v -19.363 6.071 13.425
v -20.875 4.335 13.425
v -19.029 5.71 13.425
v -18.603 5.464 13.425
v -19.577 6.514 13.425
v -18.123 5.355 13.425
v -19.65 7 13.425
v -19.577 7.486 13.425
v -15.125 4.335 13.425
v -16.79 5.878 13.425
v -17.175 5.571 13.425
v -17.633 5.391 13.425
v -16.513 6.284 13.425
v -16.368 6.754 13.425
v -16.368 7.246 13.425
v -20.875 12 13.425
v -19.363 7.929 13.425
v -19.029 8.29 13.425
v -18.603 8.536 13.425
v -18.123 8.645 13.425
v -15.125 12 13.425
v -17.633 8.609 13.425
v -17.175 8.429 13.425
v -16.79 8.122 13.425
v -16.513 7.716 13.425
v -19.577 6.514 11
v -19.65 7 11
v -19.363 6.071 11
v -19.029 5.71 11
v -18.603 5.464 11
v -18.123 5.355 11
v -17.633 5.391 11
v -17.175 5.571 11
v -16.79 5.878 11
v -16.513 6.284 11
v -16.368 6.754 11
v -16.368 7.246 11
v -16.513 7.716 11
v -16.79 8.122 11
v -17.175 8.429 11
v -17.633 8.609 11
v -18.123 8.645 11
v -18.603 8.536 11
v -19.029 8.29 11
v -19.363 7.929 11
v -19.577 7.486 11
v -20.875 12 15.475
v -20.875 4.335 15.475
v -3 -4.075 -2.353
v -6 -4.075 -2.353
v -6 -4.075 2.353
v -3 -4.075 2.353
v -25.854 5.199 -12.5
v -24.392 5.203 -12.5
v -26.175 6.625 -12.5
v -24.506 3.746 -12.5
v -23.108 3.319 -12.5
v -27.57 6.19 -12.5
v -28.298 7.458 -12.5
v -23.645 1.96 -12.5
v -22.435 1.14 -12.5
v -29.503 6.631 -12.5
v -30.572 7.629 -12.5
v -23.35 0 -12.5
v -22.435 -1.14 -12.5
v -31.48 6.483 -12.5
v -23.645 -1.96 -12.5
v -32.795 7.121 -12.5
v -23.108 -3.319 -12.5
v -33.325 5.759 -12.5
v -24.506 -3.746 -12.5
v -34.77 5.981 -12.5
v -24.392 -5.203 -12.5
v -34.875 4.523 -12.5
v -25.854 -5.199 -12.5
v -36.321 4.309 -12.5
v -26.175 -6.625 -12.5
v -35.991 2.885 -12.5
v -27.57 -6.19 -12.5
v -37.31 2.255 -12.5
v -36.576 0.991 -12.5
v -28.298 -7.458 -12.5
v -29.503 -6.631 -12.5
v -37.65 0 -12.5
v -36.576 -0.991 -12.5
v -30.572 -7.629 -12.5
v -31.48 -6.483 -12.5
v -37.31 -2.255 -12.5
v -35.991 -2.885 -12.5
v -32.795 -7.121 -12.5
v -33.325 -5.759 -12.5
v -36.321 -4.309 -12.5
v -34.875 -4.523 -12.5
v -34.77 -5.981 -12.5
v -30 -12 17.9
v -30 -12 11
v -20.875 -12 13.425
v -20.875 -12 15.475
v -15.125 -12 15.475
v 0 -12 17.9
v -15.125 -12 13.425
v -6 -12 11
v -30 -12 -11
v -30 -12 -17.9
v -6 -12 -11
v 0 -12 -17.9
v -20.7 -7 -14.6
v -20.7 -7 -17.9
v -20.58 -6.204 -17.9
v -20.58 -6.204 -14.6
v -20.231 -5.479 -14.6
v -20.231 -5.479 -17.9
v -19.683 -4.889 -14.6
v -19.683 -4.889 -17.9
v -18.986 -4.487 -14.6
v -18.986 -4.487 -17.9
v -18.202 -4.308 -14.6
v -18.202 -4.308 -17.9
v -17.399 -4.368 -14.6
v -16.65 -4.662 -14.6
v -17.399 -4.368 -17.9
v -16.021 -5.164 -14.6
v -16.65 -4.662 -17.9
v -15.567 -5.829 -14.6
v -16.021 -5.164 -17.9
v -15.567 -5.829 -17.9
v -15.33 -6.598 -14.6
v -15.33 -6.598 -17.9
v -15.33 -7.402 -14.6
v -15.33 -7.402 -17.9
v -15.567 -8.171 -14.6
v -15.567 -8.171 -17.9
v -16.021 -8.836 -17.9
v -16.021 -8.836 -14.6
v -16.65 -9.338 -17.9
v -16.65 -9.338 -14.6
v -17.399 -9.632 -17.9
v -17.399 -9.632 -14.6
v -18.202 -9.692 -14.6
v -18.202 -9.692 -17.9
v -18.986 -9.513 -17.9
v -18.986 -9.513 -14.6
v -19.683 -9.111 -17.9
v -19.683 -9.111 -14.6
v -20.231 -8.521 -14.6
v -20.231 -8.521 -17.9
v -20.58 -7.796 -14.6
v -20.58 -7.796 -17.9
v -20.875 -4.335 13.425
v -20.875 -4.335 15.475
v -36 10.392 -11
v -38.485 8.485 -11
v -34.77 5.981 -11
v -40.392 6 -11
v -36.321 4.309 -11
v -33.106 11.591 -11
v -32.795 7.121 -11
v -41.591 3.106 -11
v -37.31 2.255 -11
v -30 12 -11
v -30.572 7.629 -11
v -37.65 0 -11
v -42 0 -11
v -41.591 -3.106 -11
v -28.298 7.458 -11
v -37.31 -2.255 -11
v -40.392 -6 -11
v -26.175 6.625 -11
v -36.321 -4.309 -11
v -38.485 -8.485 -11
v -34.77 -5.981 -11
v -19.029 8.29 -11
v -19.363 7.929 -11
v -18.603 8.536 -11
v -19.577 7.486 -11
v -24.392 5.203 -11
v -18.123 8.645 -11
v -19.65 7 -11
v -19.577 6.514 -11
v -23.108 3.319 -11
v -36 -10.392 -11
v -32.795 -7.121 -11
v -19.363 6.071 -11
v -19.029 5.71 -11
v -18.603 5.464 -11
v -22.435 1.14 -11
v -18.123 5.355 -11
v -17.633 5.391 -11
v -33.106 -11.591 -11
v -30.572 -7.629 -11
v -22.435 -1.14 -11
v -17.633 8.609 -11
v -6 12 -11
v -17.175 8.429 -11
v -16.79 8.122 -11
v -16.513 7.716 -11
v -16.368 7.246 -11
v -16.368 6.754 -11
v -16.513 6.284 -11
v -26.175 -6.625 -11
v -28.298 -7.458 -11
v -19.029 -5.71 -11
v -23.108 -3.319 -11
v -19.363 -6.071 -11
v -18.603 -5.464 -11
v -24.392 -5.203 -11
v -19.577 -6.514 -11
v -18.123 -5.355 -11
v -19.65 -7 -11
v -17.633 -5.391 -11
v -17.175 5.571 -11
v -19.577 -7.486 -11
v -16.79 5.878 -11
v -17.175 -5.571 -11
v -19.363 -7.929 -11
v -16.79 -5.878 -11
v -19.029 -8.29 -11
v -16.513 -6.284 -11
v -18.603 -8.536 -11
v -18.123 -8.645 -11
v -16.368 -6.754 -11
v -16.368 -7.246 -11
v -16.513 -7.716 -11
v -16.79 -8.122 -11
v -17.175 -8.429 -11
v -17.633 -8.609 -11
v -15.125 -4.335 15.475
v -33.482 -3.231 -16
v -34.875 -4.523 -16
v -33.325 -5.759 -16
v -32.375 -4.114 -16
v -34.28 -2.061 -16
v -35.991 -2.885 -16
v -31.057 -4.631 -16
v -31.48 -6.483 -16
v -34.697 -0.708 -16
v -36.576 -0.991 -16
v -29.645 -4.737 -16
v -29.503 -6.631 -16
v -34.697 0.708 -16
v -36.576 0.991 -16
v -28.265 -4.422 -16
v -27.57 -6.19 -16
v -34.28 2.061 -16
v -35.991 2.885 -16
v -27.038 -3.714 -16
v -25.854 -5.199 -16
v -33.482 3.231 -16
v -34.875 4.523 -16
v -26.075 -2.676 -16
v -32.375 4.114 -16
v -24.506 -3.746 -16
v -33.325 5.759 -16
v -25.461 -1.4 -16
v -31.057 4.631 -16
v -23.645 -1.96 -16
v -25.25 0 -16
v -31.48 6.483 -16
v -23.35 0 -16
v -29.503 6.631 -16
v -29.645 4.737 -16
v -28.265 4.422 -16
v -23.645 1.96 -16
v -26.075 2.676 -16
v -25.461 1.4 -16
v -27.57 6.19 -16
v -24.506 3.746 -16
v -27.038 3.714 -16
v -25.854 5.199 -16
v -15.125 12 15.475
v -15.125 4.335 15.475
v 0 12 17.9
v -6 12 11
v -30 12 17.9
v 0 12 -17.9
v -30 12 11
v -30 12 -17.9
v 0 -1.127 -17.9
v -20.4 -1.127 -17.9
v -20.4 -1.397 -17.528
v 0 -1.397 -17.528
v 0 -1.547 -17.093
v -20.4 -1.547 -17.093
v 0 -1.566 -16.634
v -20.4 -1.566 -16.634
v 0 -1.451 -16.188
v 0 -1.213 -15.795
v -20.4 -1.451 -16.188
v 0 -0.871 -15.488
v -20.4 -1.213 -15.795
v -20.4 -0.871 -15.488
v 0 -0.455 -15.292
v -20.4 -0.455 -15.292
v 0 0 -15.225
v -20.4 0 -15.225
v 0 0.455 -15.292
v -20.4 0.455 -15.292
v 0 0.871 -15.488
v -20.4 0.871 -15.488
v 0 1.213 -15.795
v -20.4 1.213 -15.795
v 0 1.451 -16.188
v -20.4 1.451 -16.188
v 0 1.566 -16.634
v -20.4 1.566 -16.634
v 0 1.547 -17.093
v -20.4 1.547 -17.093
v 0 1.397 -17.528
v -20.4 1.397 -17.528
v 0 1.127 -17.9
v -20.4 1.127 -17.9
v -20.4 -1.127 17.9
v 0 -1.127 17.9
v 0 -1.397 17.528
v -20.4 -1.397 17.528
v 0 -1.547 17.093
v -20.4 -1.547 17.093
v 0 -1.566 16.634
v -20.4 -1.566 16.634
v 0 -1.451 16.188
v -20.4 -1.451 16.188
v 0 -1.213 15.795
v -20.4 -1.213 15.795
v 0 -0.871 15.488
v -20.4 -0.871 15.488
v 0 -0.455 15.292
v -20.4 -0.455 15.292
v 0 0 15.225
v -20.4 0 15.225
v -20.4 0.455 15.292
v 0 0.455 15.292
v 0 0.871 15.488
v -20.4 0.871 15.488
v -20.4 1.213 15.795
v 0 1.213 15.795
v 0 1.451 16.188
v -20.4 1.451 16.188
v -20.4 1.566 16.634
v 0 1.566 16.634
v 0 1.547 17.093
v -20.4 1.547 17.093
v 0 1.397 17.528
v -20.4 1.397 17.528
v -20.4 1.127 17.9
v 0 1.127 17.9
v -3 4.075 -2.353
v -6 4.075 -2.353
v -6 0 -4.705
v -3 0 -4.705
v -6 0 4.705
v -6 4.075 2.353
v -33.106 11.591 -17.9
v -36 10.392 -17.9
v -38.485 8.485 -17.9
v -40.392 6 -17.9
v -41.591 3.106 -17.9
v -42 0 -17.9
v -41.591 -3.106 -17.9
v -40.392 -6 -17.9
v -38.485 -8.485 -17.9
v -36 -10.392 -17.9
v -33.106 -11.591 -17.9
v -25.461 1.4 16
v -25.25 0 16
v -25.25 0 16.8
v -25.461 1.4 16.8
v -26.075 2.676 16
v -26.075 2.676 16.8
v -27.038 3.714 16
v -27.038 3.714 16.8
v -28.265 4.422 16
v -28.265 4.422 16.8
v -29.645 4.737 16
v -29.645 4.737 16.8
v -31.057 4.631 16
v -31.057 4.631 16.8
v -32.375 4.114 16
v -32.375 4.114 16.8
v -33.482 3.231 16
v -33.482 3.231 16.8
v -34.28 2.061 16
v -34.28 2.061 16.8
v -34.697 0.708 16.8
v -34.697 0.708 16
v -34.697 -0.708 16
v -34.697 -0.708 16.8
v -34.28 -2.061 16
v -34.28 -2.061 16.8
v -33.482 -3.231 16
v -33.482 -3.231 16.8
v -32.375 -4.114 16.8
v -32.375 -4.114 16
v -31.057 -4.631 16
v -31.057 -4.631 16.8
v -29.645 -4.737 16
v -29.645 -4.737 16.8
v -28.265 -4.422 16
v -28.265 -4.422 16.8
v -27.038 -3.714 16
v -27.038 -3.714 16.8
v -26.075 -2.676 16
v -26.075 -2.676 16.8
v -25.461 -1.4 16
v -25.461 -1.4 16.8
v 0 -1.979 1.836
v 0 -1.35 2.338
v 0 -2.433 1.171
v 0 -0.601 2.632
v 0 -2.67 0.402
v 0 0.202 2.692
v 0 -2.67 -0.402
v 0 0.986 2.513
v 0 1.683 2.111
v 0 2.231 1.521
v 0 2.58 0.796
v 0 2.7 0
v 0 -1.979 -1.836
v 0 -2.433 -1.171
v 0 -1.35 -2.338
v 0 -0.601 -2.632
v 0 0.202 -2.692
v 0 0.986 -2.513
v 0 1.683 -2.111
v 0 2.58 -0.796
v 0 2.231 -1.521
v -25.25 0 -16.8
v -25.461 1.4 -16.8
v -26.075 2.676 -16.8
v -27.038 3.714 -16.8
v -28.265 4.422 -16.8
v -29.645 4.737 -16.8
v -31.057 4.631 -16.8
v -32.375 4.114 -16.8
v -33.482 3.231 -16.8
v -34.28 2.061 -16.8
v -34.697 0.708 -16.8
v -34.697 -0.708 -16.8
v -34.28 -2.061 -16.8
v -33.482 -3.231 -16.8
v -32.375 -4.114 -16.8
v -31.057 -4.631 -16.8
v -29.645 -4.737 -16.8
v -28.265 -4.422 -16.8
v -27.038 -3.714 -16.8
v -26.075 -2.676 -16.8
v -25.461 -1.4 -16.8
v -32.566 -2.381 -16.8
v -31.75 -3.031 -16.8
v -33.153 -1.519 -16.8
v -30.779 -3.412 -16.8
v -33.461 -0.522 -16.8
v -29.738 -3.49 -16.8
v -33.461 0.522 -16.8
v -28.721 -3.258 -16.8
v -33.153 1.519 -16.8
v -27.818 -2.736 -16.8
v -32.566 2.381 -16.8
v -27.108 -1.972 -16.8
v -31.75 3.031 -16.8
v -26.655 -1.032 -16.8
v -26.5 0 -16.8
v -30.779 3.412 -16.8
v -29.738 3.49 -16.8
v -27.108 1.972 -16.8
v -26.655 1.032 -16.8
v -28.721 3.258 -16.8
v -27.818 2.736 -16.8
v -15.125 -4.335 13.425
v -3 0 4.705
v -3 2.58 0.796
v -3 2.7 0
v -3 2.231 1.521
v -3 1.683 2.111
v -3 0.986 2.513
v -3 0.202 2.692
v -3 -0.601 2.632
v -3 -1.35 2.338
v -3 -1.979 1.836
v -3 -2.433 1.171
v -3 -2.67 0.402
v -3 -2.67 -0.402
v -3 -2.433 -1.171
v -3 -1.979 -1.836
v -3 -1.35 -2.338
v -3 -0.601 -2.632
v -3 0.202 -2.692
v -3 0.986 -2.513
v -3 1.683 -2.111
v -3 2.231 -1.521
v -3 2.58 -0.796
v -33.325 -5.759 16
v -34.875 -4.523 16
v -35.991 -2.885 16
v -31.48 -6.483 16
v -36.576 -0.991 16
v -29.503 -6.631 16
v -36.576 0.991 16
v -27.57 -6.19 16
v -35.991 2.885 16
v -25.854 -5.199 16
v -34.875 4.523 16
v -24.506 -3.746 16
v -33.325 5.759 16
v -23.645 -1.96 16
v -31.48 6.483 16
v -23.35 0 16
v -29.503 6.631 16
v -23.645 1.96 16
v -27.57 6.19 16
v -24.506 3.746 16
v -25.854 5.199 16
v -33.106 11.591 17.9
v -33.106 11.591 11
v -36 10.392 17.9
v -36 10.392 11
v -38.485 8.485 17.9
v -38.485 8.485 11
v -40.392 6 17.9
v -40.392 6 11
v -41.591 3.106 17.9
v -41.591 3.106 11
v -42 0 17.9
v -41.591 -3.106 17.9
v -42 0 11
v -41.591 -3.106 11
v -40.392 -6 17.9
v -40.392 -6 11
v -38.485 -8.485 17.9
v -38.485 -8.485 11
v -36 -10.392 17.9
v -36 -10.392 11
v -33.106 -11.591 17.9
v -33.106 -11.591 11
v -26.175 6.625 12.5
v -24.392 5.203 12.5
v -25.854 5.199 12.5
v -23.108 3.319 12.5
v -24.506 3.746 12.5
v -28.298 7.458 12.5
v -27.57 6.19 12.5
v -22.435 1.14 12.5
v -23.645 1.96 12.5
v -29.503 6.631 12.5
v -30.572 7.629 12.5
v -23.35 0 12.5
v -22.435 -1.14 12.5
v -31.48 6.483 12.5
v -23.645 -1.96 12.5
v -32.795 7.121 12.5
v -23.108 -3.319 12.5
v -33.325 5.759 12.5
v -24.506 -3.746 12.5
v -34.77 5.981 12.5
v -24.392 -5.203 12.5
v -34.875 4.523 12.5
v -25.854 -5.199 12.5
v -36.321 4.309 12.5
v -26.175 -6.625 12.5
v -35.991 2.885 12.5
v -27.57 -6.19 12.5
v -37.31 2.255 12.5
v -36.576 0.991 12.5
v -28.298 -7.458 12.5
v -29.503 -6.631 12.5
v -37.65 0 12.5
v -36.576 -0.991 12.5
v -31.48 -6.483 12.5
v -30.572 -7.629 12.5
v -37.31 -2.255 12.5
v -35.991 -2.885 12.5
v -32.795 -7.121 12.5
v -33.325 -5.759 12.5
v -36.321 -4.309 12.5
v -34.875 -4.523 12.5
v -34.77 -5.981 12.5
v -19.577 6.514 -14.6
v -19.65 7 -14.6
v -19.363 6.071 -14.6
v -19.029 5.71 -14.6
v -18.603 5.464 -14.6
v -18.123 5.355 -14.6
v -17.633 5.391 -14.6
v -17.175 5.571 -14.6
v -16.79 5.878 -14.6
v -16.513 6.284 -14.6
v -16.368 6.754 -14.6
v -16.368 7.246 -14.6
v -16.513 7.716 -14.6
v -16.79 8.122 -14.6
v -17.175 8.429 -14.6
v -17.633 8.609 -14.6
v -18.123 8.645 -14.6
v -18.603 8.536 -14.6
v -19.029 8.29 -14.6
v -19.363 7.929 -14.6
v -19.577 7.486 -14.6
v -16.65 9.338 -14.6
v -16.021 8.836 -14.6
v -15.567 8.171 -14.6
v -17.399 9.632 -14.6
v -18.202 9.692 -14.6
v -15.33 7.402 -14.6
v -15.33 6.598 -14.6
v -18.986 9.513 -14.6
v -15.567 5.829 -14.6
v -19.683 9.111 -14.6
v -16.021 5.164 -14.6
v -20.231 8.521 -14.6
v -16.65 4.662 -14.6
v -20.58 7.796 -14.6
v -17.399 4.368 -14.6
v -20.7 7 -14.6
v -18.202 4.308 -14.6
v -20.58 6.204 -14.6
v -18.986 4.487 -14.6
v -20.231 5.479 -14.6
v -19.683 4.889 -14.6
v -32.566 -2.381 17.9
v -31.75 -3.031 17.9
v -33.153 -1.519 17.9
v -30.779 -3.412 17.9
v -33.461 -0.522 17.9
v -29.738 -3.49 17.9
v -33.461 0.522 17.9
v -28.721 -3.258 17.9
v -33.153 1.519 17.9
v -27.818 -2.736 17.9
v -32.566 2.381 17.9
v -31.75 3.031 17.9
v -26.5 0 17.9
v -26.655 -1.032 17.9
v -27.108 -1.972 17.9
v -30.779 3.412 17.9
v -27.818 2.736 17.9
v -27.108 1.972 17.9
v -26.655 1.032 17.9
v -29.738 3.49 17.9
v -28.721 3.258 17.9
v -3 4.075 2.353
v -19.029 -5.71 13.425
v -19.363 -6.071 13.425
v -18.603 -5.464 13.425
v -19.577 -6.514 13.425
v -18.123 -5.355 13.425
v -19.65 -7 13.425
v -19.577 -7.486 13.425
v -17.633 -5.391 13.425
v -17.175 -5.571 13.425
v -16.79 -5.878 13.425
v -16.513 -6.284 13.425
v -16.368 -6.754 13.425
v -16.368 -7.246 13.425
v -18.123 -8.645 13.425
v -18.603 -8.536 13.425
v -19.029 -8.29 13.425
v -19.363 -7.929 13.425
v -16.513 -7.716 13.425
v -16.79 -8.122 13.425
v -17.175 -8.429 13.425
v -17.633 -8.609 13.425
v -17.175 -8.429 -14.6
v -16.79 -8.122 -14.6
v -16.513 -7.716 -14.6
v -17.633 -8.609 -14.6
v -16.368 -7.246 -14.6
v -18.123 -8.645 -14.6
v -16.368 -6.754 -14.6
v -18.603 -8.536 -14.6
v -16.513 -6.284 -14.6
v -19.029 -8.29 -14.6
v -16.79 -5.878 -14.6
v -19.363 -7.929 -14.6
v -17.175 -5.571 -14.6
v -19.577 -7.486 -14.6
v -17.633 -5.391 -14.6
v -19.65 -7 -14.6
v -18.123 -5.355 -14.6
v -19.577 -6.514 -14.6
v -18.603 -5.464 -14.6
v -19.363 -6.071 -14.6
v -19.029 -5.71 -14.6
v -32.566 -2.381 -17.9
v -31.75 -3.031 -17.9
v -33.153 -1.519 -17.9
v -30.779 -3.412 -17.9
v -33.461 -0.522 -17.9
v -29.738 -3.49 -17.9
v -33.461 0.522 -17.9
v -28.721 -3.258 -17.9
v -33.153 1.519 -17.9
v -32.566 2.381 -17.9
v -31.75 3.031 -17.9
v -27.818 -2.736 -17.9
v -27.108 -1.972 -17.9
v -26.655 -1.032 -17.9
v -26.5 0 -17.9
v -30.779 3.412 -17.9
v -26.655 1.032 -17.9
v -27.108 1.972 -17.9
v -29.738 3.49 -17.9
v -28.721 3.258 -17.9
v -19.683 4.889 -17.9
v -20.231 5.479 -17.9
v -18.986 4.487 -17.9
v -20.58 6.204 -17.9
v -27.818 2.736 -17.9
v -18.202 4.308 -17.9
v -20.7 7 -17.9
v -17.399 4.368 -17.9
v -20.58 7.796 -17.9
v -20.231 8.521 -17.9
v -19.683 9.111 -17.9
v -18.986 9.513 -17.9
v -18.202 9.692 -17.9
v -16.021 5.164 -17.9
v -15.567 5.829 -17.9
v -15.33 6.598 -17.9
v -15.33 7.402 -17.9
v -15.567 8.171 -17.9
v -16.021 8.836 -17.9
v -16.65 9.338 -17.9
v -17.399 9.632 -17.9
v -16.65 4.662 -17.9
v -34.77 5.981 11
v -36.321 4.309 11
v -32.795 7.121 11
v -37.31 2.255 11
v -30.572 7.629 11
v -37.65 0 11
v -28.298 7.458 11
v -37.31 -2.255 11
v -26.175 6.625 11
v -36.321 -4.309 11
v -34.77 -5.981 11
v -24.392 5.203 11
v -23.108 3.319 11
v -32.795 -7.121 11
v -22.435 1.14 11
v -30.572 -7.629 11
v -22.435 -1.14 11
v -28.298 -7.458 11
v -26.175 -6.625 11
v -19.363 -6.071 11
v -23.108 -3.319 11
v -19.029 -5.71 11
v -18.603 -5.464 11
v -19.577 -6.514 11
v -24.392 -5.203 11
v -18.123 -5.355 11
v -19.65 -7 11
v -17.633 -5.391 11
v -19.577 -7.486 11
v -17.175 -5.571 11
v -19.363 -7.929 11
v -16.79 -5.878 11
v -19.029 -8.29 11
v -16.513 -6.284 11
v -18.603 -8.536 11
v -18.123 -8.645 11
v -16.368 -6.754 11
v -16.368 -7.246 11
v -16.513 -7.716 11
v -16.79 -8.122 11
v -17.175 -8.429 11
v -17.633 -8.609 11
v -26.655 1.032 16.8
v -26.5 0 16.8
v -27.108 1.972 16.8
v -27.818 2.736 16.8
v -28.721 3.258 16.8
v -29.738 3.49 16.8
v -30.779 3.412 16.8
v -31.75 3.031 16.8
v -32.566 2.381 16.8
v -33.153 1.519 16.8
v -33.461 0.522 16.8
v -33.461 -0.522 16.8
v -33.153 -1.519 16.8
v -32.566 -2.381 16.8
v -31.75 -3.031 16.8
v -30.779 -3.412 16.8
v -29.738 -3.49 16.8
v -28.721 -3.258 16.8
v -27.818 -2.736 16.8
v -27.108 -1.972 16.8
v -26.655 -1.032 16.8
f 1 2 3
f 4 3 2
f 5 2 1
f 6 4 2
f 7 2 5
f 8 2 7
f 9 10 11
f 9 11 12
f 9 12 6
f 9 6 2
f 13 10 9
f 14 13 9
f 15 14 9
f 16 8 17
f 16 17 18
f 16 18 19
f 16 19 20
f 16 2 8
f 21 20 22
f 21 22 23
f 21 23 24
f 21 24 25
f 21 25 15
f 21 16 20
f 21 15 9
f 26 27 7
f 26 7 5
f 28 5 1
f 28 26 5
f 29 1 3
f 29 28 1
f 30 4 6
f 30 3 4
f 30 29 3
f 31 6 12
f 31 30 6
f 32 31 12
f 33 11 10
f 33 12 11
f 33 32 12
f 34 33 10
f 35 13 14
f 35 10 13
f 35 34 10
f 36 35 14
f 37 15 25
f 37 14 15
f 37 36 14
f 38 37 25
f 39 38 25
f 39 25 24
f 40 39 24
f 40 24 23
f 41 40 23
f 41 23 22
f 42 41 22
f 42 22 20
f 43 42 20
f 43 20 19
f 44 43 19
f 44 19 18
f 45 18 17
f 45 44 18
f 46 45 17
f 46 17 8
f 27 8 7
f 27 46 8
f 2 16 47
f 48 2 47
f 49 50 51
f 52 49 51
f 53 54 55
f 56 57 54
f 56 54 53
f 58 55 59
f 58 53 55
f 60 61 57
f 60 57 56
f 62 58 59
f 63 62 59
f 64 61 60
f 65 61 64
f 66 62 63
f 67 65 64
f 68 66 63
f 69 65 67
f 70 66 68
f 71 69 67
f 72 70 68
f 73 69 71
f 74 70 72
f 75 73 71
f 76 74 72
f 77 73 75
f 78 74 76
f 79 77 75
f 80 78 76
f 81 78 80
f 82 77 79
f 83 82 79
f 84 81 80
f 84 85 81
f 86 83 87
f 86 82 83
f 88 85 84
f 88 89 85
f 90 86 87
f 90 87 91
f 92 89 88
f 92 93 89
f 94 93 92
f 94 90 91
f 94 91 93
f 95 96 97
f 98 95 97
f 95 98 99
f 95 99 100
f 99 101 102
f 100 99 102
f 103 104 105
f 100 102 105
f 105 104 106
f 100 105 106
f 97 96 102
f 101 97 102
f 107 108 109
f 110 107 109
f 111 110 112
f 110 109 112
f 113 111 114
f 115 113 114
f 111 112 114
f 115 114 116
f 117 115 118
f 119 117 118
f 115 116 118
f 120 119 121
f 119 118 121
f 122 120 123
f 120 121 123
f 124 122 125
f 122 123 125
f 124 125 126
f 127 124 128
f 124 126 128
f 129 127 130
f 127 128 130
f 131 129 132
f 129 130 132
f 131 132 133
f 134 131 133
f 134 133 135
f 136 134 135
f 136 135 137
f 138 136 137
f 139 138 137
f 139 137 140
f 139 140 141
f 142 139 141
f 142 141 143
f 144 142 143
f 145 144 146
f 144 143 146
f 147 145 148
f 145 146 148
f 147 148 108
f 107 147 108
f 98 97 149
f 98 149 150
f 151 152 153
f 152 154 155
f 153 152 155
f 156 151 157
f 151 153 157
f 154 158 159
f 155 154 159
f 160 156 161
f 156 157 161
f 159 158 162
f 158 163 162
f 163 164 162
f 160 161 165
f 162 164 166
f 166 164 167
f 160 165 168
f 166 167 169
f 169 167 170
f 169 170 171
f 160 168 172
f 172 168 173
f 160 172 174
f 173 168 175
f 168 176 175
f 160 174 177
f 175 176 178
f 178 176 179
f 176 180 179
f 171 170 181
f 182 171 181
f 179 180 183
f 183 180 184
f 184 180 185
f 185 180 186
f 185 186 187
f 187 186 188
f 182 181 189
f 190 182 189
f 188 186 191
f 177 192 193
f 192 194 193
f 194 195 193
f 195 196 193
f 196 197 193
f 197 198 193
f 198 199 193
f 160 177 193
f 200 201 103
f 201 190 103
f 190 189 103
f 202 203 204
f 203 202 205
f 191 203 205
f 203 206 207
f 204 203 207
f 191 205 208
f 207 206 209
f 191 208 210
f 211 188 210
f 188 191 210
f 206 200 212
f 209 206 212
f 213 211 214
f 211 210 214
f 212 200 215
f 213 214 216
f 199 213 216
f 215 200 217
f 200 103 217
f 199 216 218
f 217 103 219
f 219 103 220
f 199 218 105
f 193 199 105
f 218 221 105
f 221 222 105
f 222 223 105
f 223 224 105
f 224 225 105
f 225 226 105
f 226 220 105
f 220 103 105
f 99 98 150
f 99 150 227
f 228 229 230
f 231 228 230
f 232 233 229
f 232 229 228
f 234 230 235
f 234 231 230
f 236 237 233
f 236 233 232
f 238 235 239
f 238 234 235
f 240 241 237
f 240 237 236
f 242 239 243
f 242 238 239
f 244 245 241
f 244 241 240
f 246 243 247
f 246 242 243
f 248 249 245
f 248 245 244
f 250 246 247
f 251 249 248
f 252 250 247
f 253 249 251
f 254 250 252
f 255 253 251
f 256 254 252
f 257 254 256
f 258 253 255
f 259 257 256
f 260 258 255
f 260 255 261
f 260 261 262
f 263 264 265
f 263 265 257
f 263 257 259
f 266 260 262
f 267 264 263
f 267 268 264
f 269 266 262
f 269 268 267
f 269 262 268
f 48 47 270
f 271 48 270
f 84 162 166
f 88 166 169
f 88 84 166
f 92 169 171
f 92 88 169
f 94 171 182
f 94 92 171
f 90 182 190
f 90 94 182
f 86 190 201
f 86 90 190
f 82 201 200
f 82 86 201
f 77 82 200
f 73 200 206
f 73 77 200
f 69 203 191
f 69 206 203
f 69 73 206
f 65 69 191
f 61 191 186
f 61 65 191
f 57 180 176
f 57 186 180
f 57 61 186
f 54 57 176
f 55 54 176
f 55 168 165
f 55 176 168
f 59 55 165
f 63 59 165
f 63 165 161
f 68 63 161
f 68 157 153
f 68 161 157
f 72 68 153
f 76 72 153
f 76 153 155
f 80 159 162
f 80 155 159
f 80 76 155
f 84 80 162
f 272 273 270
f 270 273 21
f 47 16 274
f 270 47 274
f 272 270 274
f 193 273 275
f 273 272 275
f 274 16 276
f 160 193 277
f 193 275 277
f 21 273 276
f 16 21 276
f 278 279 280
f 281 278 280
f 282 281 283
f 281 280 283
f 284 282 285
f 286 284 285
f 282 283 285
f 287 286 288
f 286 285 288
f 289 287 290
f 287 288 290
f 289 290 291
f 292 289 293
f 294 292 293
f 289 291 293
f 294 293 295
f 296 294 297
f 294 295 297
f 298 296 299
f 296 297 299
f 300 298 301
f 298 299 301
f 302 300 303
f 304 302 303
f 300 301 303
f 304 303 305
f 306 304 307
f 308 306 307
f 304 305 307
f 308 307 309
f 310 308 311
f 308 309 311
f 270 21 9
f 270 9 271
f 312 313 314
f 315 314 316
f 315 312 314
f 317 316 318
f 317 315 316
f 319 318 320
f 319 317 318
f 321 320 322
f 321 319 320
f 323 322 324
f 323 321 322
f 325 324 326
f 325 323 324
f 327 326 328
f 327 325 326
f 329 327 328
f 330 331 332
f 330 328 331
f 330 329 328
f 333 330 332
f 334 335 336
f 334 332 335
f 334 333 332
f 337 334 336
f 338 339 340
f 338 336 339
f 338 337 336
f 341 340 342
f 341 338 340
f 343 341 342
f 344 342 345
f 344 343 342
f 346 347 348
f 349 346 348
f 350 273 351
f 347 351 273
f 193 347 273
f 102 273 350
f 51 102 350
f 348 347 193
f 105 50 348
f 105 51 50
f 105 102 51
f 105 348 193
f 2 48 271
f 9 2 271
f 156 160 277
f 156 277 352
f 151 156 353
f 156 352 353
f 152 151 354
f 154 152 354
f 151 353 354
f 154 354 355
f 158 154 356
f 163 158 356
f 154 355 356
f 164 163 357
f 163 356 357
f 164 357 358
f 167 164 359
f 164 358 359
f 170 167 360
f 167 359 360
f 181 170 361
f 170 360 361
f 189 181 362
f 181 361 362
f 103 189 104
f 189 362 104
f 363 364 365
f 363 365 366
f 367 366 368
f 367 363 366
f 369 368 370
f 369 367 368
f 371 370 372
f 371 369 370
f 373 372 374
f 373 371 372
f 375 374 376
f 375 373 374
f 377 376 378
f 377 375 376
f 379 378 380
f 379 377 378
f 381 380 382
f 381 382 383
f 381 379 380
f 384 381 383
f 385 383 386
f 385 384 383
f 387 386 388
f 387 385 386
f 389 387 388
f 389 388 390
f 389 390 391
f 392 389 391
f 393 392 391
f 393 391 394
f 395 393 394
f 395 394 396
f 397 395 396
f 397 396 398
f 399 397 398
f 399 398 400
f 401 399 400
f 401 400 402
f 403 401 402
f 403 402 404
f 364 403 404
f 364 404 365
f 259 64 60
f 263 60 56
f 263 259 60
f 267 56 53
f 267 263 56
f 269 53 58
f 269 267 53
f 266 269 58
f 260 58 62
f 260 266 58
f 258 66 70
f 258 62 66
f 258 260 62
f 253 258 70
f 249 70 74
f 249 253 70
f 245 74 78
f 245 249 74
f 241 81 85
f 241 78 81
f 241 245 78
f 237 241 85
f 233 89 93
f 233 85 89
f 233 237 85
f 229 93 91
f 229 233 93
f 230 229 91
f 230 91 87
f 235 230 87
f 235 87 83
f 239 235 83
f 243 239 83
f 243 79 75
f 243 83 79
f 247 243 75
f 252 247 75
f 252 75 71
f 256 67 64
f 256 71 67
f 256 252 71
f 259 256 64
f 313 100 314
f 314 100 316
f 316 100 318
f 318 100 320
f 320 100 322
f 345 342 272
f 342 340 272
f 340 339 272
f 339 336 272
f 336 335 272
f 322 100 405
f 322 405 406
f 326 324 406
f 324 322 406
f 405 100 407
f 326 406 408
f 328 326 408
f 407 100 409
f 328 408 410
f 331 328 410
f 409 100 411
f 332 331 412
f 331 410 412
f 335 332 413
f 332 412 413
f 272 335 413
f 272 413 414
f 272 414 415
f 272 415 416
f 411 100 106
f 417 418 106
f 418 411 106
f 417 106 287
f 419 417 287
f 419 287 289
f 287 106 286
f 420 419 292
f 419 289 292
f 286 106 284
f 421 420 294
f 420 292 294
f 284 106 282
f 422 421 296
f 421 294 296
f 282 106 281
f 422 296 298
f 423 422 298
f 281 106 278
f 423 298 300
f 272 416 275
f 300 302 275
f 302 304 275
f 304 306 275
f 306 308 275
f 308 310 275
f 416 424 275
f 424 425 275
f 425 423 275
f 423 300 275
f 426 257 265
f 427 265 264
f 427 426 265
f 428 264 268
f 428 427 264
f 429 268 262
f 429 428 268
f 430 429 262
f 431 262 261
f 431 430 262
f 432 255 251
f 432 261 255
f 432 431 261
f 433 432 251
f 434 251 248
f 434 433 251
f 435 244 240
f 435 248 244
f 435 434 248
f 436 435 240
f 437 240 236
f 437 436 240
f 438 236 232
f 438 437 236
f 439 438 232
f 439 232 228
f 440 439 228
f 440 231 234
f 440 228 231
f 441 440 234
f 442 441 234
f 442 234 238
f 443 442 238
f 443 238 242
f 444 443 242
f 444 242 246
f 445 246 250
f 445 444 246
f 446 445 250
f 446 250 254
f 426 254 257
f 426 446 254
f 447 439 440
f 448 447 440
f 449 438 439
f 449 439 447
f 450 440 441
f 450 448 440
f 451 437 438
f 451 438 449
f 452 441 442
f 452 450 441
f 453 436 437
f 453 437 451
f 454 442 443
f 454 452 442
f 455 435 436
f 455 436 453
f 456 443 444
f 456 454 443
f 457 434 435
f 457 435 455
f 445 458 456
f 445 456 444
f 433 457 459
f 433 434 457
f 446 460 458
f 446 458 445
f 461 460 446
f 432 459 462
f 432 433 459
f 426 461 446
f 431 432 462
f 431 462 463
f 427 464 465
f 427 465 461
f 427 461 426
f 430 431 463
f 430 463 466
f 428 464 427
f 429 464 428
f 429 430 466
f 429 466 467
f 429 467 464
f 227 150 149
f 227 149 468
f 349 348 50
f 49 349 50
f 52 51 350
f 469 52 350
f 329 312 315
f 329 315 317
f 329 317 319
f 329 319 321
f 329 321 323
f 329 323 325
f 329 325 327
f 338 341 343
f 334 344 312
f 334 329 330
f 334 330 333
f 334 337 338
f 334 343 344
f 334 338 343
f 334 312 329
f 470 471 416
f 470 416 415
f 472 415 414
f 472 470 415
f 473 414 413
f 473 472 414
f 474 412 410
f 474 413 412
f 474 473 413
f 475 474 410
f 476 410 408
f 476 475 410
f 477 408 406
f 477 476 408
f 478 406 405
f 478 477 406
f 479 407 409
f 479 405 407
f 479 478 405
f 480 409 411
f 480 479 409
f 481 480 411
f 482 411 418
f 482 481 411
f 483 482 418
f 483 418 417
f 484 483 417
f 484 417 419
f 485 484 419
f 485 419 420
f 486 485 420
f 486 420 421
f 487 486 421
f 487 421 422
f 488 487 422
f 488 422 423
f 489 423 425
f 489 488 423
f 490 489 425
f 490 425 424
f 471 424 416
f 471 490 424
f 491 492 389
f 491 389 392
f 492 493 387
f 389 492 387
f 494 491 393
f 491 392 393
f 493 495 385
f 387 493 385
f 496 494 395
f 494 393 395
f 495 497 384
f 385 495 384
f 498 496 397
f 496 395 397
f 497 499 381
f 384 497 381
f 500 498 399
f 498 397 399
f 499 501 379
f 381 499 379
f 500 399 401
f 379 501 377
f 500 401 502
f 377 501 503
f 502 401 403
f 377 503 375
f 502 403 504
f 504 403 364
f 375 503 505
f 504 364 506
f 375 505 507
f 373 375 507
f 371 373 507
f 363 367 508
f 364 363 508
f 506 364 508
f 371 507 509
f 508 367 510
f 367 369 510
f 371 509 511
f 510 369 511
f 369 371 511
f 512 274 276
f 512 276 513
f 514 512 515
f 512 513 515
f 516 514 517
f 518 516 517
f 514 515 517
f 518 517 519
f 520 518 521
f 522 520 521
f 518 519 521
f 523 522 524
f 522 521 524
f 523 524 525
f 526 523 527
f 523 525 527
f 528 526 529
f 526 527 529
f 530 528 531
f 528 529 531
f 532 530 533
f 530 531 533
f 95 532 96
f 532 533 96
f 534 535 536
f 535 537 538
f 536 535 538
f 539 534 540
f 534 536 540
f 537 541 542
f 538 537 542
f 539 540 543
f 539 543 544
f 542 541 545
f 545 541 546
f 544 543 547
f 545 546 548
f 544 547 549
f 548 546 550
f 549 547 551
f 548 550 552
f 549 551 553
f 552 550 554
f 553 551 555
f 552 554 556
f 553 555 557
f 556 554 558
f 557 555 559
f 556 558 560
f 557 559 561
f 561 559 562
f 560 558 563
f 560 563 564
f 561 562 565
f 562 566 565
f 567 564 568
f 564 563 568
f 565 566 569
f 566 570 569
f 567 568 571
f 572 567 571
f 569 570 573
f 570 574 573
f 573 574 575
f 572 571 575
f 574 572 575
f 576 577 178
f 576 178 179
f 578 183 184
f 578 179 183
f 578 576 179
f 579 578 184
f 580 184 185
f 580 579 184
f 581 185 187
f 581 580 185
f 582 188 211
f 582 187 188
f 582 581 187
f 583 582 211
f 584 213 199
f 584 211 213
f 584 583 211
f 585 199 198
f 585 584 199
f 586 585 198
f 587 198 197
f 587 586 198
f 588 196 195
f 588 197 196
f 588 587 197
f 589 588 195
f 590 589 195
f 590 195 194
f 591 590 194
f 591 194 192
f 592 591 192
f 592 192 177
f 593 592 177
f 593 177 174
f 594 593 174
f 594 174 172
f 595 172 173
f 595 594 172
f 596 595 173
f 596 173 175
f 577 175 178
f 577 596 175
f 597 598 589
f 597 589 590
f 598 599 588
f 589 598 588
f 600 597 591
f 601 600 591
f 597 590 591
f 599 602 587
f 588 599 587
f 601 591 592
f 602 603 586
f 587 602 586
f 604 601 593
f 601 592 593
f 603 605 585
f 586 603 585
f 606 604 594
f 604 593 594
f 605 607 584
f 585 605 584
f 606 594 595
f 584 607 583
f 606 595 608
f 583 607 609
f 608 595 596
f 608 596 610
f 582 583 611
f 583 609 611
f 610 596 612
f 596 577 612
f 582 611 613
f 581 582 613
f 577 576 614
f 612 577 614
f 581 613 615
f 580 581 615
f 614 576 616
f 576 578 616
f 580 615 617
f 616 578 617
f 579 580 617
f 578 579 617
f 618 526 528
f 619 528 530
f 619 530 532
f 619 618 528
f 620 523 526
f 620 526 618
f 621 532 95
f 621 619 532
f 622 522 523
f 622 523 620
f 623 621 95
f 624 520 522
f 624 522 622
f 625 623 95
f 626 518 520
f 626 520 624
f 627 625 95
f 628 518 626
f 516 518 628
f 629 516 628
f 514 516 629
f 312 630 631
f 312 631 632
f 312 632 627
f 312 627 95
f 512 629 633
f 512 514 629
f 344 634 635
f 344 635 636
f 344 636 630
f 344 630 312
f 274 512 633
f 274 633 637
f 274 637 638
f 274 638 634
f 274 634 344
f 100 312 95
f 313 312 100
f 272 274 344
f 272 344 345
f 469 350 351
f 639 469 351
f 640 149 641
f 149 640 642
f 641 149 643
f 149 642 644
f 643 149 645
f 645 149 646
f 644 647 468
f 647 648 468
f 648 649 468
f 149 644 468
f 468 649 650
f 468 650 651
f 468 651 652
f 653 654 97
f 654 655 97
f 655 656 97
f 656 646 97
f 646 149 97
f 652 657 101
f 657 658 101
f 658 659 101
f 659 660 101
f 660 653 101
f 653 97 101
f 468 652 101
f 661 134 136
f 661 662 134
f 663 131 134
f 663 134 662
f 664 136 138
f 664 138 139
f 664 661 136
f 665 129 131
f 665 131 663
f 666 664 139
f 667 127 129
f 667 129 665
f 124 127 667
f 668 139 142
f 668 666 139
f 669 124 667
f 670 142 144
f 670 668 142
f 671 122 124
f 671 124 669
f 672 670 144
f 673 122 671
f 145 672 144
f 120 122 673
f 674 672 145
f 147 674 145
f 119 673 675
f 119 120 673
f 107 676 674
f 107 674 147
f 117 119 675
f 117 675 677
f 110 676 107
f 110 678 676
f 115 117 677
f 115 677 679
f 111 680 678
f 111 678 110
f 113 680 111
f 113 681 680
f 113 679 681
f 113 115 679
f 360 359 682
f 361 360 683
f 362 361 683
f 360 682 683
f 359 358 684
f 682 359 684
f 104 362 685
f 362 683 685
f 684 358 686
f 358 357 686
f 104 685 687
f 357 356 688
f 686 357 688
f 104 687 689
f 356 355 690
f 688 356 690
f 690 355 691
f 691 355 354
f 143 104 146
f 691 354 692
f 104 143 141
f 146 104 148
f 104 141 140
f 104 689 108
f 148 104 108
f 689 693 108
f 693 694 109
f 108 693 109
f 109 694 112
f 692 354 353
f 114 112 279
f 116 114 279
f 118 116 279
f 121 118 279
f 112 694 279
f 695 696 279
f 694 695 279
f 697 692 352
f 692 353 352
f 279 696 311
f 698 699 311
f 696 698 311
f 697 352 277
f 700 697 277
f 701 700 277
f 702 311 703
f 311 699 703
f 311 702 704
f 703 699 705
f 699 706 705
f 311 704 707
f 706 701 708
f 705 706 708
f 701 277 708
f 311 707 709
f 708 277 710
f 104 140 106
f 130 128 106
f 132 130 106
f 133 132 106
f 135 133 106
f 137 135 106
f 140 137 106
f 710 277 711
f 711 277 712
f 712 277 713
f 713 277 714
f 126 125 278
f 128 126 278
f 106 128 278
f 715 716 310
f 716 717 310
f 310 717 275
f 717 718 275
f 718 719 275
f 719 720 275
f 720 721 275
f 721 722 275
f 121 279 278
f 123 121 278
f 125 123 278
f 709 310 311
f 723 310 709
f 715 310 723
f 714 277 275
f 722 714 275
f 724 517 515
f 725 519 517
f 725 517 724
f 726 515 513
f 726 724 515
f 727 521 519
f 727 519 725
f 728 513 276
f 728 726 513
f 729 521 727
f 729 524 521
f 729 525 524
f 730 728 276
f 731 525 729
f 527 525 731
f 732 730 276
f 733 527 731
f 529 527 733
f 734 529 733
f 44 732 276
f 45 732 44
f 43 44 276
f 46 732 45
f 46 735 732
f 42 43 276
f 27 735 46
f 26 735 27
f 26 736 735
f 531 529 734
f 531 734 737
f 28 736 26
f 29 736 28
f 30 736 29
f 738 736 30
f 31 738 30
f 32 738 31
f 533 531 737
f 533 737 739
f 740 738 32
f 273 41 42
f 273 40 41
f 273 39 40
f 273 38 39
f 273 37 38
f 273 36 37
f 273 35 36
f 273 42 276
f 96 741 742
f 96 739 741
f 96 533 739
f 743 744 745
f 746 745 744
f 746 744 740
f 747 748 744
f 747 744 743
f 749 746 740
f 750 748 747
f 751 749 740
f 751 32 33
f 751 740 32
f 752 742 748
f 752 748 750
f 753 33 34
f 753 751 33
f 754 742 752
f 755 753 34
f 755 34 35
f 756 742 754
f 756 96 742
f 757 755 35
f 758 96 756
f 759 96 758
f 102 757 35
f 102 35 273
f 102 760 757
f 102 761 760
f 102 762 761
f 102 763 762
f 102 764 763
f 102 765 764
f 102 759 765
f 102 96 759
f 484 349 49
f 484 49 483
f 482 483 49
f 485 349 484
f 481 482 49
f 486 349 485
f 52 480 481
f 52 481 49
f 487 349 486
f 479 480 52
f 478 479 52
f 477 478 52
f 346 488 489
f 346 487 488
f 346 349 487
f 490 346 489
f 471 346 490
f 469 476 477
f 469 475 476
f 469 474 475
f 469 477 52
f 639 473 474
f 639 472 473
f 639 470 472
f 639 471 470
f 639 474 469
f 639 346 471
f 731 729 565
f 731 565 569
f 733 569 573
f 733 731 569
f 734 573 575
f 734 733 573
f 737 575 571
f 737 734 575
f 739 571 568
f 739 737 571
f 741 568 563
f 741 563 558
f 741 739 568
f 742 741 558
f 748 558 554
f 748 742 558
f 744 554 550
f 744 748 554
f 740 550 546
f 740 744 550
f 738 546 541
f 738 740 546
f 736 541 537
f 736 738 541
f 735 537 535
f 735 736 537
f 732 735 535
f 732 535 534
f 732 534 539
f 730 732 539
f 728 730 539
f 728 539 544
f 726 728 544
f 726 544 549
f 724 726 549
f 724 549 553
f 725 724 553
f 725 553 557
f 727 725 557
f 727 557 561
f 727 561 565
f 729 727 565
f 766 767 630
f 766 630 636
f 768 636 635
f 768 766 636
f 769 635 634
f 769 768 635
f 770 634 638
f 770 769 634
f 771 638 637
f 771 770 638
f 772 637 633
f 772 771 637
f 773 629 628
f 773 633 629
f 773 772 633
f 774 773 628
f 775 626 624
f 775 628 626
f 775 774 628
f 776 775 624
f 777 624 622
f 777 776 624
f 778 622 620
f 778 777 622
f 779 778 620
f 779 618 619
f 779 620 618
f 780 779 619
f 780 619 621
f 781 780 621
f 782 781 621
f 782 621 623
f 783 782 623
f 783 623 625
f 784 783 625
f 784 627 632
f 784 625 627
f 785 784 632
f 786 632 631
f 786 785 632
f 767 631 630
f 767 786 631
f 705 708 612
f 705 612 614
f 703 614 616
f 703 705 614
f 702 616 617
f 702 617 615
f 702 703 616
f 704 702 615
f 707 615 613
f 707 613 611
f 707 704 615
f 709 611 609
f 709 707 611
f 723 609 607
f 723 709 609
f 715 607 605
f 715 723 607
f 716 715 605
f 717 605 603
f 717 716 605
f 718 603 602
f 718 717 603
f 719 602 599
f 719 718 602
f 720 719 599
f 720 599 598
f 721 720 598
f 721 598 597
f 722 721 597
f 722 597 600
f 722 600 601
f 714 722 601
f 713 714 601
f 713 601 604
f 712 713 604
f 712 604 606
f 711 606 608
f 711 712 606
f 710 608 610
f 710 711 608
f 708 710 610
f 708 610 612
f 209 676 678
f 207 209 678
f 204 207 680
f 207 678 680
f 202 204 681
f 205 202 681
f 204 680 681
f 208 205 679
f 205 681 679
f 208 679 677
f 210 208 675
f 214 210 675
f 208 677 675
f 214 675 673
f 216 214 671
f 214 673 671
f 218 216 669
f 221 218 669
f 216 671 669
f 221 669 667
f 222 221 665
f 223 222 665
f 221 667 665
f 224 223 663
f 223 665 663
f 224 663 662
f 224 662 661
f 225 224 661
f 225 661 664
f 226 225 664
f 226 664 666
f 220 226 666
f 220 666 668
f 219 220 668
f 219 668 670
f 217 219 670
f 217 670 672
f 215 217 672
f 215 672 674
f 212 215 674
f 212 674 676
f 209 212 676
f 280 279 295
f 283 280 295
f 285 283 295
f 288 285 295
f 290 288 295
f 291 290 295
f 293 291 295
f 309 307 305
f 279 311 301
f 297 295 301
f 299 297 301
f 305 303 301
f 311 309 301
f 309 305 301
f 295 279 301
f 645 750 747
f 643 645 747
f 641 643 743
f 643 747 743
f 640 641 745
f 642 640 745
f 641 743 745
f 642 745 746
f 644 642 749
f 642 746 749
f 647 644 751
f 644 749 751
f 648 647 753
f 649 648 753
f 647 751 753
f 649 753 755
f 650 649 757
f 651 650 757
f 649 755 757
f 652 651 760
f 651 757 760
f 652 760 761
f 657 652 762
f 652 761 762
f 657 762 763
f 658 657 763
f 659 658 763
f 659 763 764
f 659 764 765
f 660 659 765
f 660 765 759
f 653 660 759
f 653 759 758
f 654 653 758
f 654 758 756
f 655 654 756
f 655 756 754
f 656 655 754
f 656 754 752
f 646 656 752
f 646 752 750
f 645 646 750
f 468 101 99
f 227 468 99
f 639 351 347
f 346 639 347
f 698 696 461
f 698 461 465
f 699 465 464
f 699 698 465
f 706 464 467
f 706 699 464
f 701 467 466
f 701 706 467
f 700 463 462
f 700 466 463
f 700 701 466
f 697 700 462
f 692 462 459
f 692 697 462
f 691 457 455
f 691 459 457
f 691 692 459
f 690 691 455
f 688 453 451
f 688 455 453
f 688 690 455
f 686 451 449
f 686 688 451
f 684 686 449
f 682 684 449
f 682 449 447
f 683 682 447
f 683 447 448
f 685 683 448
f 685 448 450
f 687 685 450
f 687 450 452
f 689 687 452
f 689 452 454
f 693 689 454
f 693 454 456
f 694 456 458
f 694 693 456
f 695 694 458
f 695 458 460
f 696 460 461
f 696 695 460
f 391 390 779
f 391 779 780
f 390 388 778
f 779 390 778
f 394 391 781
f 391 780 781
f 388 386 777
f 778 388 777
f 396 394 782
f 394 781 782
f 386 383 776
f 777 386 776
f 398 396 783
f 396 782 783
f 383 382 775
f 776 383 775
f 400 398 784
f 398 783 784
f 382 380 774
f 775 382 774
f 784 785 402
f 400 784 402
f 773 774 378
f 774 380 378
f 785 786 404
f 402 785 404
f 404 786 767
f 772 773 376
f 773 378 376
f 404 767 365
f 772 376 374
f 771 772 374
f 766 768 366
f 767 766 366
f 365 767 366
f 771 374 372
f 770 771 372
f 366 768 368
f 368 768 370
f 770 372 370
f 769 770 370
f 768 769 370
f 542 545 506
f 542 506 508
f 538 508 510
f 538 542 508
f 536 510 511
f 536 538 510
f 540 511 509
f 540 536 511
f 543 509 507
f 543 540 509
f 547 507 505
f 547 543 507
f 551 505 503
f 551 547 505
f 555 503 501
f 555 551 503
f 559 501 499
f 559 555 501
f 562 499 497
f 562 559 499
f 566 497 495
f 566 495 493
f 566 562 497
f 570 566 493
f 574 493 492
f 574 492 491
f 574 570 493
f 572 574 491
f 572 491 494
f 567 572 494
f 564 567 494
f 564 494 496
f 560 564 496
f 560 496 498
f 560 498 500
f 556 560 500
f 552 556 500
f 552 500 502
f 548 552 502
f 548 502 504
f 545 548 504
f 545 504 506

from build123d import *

# Parameters (mm, degrees)
BOSS_EXTRUDE1_DEPTH      = 17.9
BOSS_EXTRUDE1_DEPTH_BACK = 17.9
CUT_EXTRUDE1_DEPTH       = 48.206037749
CUT_EXTRUDE1_DEPTH_BACK  = 48.206037749
SKETCH3_W                = 36
SKETCH3_H                = 22
CUT_EXTRUDE2_DEPTH       = 12.5
CUT_EXTRUDE2_DEPTH_BACK  = 12.5
SKETCH4_R                = 7.65
CUT_EXTRUDE3_DEPTH       = 16
CUT_EXTRUDE3_DEPTH_BACK  = 16
SKETCH5_R                = 6.65
CUT_EXTRUDE4_DEPTH       = 16.8
CUT_EXTRUDE4_DEPTH_BACK  = 16.8
SKETCH6_R                = 4.75
CUT_EXTRUDE5_DEPTH       = 48.206037749
CUT_EXTRUDE5_DEPTH_BACK  = 48.206037749
SKETCH7_R                = 3.5
CUT_EXTRUDE6_DEPTH       = 48.206037749
CUT_EXTRUDE6_DEPTH_BACK  = 20.4
CUT_EXTRUDE7_DEPTH       = 48.206037749
CUT_EXTRUDE7_DEPTH_BACK  = 48.206037749
SKETCH11_R               = 2.7
CUT_EXTRUDE8_DEPTH       = 3
SKETCH14_R               = 1.65
CUT_EXTRUDE10_DEPTH      = 33.3
SKETCH15_R               = 2.7
CUT_EXTRUDE11_DEPTH      = 3.3
SKETCH16_W               = 5.75
SKETCH16_H               = 2.05
CUT_EXTRUDE12_DEPTH      = 7.665


with BuildPart() as part:
    # Sketch2 → Boss-Extrude1 (new, two sides: drawn at the far end of the back side and taken through both)
    with BuildSketch(Plane.XY.offset(-BOSS_EXTRUDE1_DEPTH_BACK)):
        with BuildLine():
            Line((-30, -12), (0, -12))
            Line((0, -12), (0, 12))
            Line((0, 12), (-30, 12))
            ThreePointArc((-30, 12), (-42, 0), (-30, -12))
        make_face()
    extrude(amount=BOSS_EXTRUDE1_DEPTH + BOSS_EXTRUDE1_DEPTH_BACK)

    # Sketch3 → Cut-Extrude1 (cut, two sides: drawn at the far end of the back side and taken through both)
    with BuildSketch(Plane(origin=(0, 0, 0), x_dir=(1, 0, 0), z_dir=(0, 1, 0)).offset(-CUT_EXTRUDE1_DEPTH_BACK)):
        with Locations((-24, 0)):
            Rectangle(SKETCH3_W, SKETCH3_H)
    extrude(amount=CUT_EXTRUDE1_DEPTH + CUT_EXTRUDE1_DEPTH_BACK, mode=Mode.SUBTRACT)

    # Sketch4 → Cut-Extrude2 (cut, two sides: drawn at the far end of the back side and taken through both)
    with BuildSketch(Plane.XY.offset(-CUT_EXTRUDE2_DEPTH_BACK)):
        with Locations((-30, 0)):
            Circle(SKETCH4_R)
    extrude(amount=CUT_EXTRUDE2_DEPTH + CUT_EXTRUDE2_DEPTH_BACK, mode=Mode.SUBTRACT)

    # Sketch5 → Cut-Extrude3 (cut, two sides: drawn at the far end of the back side and taken through both)
    with BuildSketch(Plane.XY.offset(-CUT_EXTRUDE3_DEPTH_BACK)):
        with Locations((-30, 0)):
            Circle(SKETCH5_R)
    extrude(amount=CUT_EXTRUDE3_DEPTH + CUT_EXTRUDE3_DEPTH_BACK, mode=Mode.SUBTRACT)

    # Sketch6 → Cut-Extrude4 (cut, two sides: drawn at the far end of the back side and taken through both)
    with BuildSketch(Plane.XY.offset(-CUT_EXTRUDE4_DEPTH_BACK)):
        with Locations((-30, 0)):
            Circle(SKETCH6_R)
    extrude(amount=CUT_EXTRUDE4_DEPTH + CUT_EXTRUDE4_DEPTH_BACK, mode=Mode.SUBTRACT)

    # Sketch7 → Cut-Extrude5 (cut, two sides: drawn at the far end of the back side and taken through both)
    with BuildSketch(Plane.XY.offset(-CUT_EXTRUDE5_DEPTH_BACK)):
        with Locations((-30, 0)):
            Circle(SKETCH7_R)
    extrude(amount=CUT_EXTRUDE5_DEPTH + CUT_EXTRUDE5_DEPTH_BACK, mode=Mode.SUBTRACT)

    # Sketch10 → Cut-Extrude6 (cut, two sides: drawn at the far end of the back side and taken through both)
    with BuildSketch(Plane(origin=(0, 0, 0), x_dir=(0, 0, -1), z_dir=(1, 0, 0)).offset(-CUT_EXTRUDE6_DEPTH_BACK)):
        with BuildLine():
            Line((-17.9, 1.127220032), (-17.9, -1.127220032))
            ThreePointArc((-17.9, -1.127220032), (-15.225, 0), (-17.9, 1.127220032))
        make_face()
        with BuildLine():
            Line((17.9, 1.127220032), (17.9, -1.127220032))
            ThreePointArc((17.9, -1.127220032), (15.225, 0), (17.9, 1.127220032))
        make_face()
    extrude(amount=CUT_EXTRUDE6_DEPTH + CUT_EXTRUDE6_DEPTH_BACK, mode=Mode.SUBTRACT)

    # Sketch11 → Cut-Extrude7 (cut, two sides: drawn at the far end of the back side and taken through both)
    with BuildSketch(Plane(origin=(0, 0, 0), x_dir=(0, 0, -1), z_dir=(1, 0, 0)).offset(-CUT_EXTRUDE7_DEPTH_BACK)):
        Circle(SKETCH11_R)
    extrude(amount=CUT_EXTRUDE7_DEPTH + CUT_EXTRUDE7_DEPTH_BACK, mode=Mode.SUBTRACT)

    # Sketch12 → Cut-Extrude8 (cut)
    with BuildSketch(Plane.ZY.offset(6)):
        Polygon((-4.705404694, 0), (-2.352702347, -4.075), (2.352702347, -4.075), (4.705404694, 0), (2.352702347, 4.075), (-2.352702347, 4.075), align=None)
    extrude(amount=-CUT_EXTRUDE8_DEPTH, mode=Mode.SUBTRACT)

    # Sketch14 → Cut-Extrude10 (cut)
    with BuildSketch(Plane(origin=(0, 0, -17.9), x_dir=(-1, 0, 0), z_dir=(0, 0, -1))):
        with Locations((18, -7)):
            Circle(SKETCH14_R)
    cut_extrude10 = extrude(amount=-CUT_EXTRUDE10_DEPTH, mode=Mode.SUBTRACT)

    # Sketch15 → Cut-Extrude11 (cut)
    with BuildSketch(Plane(origin=(0, 0, -17.9), x_dir=(-1, 0, 0), z_dir=(0, 0, -1))):
        with Locations((18, -7)):
            Circle(SKETCH15_R)
    cut_extrude11 = extrude(amount=-CUT_EXTRUDE11_DEPTH, mode=Mode.SUBTRACT)

    # Sketch16 → Cut-Extrude12 (cut)
    with BuildSketch(Plane.XZ.offset(12)):
        with Locations((-18, 14.45)):
            Rectangle(SKETCH16_W, SKETCH16_H)
    cut_extrude12 = extrude(amount=-CUT_EXTRUDE12_DEPTH, mode=Mode.SUBTRACT)

    # Mirror1: Cut-Extrude10, Cut-Extrude11, Cut-Extrude12 across plane
    add(cut_extrude10.mirror(Plane.ZX), mode=Mode.SUBTRACT)
    add(cut_extrude11.mirror(Plane.ZX), mode=Mode.SUBTRACT)
    add(cut_extrude12.mirror(Plane.ZX), mode=Mode.SUBTRACT)


solid = part.part
